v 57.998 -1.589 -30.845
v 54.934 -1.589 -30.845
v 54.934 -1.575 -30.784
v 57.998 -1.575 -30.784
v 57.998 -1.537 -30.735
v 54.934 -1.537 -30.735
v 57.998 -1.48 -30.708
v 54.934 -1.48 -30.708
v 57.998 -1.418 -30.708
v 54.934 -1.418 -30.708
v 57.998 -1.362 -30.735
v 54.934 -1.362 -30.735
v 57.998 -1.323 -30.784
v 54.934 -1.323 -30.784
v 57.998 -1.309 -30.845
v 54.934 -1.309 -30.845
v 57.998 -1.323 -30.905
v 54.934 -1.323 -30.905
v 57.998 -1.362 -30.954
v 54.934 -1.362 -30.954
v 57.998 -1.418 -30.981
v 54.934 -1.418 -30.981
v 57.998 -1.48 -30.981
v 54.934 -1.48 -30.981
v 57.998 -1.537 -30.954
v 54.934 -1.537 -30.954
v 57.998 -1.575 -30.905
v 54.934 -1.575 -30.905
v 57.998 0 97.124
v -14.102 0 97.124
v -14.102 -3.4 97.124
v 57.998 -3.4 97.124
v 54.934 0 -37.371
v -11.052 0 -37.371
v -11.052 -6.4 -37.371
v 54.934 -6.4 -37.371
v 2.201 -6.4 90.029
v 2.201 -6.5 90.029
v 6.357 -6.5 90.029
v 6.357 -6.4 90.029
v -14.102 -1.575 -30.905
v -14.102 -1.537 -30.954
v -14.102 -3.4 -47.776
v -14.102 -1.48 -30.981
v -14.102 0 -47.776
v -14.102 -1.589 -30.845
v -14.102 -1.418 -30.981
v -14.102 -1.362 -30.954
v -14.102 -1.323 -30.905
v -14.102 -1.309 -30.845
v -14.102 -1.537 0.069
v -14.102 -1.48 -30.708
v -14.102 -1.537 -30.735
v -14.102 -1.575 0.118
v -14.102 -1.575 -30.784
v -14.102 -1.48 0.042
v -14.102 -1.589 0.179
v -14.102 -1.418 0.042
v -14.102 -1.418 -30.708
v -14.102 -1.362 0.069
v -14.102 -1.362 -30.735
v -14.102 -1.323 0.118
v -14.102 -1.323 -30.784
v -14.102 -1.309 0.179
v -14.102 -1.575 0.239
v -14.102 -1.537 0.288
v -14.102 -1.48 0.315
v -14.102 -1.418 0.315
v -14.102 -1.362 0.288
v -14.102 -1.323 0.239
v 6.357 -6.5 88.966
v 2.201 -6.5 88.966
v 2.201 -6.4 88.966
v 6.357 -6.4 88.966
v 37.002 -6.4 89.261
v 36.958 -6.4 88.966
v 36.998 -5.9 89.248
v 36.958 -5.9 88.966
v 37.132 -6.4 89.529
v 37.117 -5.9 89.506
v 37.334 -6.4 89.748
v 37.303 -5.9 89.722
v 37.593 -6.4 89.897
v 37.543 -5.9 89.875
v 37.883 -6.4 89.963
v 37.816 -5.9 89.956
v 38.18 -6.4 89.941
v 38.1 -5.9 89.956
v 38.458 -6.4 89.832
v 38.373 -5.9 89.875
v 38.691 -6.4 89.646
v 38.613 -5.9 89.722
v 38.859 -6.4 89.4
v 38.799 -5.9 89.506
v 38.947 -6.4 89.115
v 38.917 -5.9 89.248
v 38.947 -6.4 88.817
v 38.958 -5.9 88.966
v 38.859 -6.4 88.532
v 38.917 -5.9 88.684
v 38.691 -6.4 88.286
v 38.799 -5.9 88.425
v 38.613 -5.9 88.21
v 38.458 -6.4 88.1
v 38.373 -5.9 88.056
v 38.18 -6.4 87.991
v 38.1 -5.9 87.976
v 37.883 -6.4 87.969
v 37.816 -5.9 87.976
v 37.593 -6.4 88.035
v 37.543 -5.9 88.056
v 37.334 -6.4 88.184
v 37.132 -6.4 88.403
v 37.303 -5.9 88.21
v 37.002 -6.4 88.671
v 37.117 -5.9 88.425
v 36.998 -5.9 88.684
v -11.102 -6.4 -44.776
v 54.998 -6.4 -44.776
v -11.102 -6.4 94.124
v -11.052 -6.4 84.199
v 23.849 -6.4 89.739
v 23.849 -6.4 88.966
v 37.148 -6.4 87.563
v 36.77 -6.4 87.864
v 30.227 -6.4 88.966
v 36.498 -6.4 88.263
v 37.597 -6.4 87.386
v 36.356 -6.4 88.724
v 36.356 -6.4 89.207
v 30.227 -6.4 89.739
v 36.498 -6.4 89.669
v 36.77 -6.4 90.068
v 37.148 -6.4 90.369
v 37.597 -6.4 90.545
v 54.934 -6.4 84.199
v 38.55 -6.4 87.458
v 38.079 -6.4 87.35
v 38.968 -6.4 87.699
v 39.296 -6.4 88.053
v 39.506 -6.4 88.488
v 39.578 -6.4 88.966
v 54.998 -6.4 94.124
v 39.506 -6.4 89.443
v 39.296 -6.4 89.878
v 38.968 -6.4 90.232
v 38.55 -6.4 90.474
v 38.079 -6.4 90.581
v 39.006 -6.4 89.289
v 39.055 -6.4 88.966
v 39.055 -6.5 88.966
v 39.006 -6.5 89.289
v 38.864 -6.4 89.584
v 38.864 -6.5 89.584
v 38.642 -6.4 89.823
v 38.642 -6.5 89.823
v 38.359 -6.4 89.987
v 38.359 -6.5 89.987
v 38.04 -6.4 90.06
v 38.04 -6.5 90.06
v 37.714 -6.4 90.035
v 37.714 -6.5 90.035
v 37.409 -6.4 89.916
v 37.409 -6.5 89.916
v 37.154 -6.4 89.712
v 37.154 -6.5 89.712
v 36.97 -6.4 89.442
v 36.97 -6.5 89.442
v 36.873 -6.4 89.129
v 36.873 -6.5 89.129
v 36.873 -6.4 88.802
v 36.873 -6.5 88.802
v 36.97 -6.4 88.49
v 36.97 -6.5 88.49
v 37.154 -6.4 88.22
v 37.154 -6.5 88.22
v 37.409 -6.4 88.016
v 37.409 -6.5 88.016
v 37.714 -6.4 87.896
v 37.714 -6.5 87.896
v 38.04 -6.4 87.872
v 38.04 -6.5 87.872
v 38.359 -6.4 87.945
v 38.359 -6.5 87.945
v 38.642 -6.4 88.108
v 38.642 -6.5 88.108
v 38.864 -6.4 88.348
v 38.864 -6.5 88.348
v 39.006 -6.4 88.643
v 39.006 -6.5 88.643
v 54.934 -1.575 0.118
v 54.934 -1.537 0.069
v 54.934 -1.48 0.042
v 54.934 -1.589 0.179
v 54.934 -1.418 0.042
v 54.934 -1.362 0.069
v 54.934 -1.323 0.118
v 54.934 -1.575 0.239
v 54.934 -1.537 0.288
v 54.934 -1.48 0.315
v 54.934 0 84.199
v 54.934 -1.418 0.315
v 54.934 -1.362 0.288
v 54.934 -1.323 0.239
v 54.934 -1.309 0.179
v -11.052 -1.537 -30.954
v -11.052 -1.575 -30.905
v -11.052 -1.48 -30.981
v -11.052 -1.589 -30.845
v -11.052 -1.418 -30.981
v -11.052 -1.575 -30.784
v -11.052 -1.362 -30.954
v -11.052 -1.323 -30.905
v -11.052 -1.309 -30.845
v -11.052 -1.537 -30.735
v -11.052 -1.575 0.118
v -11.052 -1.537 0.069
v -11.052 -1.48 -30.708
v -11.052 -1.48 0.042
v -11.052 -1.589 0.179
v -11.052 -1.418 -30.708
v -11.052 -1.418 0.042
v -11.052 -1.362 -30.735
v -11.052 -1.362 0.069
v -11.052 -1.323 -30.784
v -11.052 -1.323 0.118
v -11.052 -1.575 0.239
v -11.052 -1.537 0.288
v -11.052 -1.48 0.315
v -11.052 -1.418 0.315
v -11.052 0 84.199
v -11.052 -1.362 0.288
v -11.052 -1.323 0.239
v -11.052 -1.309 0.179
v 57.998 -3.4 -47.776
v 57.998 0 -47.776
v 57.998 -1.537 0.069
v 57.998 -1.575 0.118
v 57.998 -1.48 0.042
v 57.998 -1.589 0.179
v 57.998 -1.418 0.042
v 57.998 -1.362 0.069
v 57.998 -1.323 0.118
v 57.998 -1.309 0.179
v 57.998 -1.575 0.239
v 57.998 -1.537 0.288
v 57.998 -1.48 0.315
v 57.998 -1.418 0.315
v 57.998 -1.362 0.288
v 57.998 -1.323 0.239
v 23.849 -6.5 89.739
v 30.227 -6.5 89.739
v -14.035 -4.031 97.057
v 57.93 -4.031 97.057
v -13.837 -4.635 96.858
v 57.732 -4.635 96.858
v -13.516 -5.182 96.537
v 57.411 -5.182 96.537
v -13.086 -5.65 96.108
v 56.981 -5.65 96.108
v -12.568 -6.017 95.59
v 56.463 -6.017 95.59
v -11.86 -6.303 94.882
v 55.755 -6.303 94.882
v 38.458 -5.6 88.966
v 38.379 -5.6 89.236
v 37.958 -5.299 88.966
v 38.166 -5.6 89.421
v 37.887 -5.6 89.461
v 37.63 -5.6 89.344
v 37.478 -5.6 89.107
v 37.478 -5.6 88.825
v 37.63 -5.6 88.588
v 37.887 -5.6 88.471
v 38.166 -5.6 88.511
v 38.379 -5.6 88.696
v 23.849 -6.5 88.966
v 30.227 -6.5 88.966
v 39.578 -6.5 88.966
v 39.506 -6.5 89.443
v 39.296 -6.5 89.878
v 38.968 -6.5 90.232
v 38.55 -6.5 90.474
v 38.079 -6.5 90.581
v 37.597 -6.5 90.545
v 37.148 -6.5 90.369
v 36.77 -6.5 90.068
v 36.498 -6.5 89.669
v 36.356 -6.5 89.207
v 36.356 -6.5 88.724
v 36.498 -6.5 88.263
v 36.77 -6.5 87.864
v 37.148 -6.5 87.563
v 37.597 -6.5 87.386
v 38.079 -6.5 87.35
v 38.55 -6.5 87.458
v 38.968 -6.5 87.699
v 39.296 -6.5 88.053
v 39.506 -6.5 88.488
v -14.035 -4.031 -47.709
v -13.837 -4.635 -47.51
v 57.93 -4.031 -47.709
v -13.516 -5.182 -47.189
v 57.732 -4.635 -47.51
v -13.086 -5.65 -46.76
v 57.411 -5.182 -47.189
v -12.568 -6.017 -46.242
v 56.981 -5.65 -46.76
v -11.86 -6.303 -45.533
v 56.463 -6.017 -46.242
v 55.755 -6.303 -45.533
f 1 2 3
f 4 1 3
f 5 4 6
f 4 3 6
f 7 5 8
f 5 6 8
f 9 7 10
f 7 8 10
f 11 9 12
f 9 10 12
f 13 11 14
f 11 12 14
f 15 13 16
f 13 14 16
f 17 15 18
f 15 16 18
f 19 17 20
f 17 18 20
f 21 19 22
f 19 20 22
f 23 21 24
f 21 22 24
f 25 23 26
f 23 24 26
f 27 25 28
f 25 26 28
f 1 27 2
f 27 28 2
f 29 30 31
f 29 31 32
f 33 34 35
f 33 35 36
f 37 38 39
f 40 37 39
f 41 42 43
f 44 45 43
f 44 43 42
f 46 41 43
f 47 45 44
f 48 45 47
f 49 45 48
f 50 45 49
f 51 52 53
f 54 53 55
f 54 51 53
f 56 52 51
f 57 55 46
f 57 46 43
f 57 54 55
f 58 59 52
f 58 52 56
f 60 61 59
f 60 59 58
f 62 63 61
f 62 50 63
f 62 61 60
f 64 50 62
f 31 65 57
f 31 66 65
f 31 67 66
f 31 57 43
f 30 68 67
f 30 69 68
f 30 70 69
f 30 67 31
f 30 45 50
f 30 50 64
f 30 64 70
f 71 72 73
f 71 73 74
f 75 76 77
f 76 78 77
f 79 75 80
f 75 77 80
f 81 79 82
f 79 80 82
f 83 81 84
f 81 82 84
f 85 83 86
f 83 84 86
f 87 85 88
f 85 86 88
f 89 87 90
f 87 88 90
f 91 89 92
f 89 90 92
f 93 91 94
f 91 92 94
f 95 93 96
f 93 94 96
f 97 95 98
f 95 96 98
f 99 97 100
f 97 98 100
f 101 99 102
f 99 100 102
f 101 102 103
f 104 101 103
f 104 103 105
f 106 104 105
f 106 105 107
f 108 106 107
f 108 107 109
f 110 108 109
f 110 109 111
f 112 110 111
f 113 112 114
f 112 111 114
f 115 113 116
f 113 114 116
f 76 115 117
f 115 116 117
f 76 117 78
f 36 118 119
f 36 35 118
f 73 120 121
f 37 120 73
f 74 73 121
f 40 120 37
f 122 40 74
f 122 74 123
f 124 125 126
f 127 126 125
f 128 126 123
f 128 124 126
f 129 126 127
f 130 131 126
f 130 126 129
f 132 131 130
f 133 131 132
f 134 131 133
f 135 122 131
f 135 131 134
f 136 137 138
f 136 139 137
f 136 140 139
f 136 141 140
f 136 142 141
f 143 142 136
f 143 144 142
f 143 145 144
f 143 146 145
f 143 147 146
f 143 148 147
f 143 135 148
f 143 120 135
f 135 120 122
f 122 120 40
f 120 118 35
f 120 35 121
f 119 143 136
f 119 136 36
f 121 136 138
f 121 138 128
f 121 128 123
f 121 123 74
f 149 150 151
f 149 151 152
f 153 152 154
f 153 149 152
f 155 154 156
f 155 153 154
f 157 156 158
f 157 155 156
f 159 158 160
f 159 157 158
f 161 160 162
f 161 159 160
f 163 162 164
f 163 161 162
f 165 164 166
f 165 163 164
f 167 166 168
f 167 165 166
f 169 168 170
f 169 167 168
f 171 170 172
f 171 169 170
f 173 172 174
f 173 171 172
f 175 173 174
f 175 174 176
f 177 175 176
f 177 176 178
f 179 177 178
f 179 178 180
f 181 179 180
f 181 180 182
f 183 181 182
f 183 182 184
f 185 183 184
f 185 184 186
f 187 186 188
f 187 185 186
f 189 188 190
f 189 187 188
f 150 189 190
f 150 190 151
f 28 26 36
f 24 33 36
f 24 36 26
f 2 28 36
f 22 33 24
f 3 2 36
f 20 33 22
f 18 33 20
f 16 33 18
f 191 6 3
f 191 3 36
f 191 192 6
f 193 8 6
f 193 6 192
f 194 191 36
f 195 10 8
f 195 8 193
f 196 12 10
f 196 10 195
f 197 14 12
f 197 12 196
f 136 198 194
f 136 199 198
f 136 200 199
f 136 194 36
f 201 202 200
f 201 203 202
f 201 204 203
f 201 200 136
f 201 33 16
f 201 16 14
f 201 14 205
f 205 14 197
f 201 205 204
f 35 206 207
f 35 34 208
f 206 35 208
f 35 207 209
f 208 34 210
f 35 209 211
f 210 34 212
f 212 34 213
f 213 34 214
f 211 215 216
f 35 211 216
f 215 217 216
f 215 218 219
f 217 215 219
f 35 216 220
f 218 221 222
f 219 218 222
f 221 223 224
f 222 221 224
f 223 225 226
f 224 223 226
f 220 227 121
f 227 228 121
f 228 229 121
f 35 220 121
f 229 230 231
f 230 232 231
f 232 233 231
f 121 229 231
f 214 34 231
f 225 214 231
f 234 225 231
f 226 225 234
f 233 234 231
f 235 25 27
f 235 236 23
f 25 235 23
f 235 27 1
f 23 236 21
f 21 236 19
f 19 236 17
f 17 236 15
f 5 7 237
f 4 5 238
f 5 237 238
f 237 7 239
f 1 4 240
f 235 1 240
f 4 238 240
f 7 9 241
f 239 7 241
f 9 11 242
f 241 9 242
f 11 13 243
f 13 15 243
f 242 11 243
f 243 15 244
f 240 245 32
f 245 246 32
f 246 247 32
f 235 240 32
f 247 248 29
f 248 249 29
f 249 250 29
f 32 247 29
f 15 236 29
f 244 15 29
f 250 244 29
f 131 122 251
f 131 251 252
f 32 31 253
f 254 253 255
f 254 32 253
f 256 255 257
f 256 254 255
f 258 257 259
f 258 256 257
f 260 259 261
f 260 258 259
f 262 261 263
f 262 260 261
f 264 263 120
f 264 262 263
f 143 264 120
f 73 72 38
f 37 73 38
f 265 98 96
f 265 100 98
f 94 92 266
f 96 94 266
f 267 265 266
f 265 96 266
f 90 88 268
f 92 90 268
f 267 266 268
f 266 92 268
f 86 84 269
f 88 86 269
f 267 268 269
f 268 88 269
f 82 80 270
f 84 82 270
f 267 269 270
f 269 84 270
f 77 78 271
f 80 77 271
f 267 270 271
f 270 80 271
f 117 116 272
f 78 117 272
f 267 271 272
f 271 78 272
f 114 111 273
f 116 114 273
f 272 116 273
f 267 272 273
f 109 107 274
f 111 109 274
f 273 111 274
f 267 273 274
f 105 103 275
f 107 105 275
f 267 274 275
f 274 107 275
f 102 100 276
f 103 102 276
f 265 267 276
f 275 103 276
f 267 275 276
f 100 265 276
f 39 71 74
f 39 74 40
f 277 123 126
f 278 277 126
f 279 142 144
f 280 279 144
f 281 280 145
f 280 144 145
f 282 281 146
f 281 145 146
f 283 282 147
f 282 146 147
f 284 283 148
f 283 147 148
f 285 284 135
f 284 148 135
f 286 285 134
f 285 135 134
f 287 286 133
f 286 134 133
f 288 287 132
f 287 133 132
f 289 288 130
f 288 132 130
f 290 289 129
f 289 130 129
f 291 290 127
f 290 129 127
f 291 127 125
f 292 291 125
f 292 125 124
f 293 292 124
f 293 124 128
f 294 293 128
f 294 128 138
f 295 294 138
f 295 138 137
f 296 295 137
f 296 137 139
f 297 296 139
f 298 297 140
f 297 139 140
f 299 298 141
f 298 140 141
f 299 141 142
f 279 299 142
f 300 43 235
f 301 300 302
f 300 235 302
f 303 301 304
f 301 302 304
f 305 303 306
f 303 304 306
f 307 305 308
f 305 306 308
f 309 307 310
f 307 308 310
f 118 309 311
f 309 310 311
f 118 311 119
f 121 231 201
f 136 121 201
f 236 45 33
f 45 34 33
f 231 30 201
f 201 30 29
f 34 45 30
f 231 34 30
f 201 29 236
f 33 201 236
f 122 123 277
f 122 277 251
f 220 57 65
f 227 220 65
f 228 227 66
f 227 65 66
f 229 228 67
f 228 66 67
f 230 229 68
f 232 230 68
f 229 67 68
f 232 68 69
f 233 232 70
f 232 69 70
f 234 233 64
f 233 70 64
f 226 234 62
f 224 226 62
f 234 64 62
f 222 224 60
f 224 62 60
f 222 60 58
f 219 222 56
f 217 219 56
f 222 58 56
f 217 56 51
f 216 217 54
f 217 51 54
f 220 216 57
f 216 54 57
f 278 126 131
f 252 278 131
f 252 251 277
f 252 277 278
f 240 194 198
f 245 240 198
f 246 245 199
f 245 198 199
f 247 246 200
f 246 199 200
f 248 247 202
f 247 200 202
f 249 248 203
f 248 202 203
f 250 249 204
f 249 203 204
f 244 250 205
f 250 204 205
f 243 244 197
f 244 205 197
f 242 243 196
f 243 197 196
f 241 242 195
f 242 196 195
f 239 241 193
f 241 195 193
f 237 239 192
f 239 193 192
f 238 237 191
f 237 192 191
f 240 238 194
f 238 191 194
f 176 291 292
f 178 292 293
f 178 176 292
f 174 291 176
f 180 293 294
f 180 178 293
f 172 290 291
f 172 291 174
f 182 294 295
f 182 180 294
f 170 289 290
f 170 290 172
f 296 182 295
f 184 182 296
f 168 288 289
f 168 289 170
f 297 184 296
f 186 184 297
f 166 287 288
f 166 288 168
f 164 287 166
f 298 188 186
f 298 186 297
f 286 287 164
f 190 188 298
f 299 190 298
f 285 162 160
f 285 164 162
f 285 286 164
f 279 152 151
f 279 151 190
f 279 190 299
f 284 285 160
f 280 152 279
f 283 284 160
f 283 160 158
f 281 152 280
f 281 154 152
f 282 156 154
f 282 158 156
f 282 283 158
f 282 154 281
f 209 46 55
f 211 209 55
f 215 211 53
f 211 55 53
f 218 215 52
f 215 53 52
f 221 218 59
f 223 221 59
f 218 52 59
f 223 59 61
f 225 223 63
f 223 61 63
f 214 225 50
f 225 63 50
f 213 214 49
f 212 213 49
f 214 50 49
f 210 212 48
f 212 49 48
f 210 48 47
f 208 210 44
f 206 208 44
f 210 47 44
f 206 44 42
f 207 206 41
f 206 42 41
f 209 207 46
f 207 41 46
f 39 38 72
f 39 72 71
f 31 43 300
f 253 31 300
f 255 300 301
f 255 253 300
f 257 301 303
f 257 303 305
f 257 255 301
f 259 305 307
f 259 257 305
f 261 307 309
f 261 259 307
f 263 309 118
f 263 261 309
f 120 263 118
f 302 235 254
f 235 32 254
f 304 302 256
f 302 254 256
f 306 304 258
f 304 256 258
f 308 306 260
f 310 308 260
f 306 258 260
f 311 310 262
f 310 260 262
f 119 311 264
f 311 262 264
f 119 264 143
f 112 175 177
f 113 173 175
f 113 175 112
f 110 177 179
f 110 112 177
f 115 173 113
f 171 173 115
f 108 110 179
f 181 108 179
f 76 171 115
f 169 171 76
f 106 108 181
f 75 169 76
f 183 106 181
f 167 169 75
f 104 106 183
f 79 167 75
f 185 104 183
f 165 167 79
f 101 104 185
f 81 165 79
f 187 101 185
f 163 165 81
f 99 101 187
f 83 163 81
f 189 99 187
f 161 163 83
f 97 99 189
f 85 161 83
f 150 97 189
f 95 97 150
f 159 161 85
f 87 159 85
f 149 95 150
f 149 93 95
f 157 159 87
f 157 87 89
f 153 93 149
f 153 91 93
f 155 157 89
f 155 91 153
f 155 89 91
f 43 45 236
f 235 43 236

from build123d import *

# Parameters (mm, degrees)
F0_W      = 72.1
F0_H      = 144.9
F0_W_2    = 65.9861192107
F0_H_2    = 121.5704865754
F1_DEPTH  = 6.4
F2_R      = 3
F3_R      = 1.6199699766
F3_R_2    = 1.0969181454
F3_W      = 6.3781980425
F3_H      = 0.7731094956
F3_W_2    = 4.1554919444
F3_H_2    = 1.0630339384
F4_DEPTH  = 0.1
F6_D      = 0.28
F13_D     = 2
F13_DEPTH = 0.5
F13_TIP   = 0.600860619


# Not quite as in the source:
# - the program builds the solid bodies; features that only make, move or delete a surface that nothing else refers to are left out


with BuildPart() as f1:
    # F0 (on Front) → F1 (new body)
    with BuildSketch(Plane.XZ):
        with Locations((21.9475186944, 24.6742434323)):
            Rectangle(F0_W, F0_H)
        with Locations((21.9411961734, 23.4142001718)):
            Rectangle(F0_W_2, F0_H_2, mode=Mode.SUBTRACT)
    extrude(amount=F1_DEPTH)

    # F2
    f2_edges = [f1.edges().sort_by_distance(p)[0] for p in [
        (21.947519, -6.4, 97.124243),
        (-14.102481, -6.4, 24.674243),
        (21.947519, -6.4, -47.775757),
        (57.997519, -6.4, 24.674243),
    ]]
    fillet(f2_edges, radius=F2_R)

    # F3 (on face) → F4 (join, symmetric)
    with BuildSketch(Plane.XZ.offset(6.4)):
        with Locations((37.9579253495, 88.9658480883)):
            Circle(F3_R)
        with Locations((37.9579253495, 88.9658480883)):
            Circle(F3_R_2, mode=Mode.SUBTRACT)
        with Locations((27.0376754925, 89.3524028361)):
            Rectangle(F3_W, F3_H)
        with Locations((4.2791056912, 89.4973650575)):
            Rectangle(F3_W_2, F3_H_2)
    extrude(amount=F4_DEPTH, both=True)

    # F6 (through all)
    with Locations(Plane.YZ.offset(57.9975186944)):
        with Locations((-1.4492898481, -30.8446902782), (-1.4492898481, 0.1785024215)):
            Hole(F6_D / 2)

    # F13
    with Locations(Plane.XZ.offset(6.4)):
        with Locations((37.9579253495, 88.9658480883)):
            Hole(F13_D / 2, depth=F13_DEPTH)
            with Locations((0, 0, -(F13_DEPTH + F13_TIP / 2))):  # 118° drill point
                Cone(0, F13_D / 2, F13_TIP, mode=Mode.SUBTRACT)


solid = f1.part
